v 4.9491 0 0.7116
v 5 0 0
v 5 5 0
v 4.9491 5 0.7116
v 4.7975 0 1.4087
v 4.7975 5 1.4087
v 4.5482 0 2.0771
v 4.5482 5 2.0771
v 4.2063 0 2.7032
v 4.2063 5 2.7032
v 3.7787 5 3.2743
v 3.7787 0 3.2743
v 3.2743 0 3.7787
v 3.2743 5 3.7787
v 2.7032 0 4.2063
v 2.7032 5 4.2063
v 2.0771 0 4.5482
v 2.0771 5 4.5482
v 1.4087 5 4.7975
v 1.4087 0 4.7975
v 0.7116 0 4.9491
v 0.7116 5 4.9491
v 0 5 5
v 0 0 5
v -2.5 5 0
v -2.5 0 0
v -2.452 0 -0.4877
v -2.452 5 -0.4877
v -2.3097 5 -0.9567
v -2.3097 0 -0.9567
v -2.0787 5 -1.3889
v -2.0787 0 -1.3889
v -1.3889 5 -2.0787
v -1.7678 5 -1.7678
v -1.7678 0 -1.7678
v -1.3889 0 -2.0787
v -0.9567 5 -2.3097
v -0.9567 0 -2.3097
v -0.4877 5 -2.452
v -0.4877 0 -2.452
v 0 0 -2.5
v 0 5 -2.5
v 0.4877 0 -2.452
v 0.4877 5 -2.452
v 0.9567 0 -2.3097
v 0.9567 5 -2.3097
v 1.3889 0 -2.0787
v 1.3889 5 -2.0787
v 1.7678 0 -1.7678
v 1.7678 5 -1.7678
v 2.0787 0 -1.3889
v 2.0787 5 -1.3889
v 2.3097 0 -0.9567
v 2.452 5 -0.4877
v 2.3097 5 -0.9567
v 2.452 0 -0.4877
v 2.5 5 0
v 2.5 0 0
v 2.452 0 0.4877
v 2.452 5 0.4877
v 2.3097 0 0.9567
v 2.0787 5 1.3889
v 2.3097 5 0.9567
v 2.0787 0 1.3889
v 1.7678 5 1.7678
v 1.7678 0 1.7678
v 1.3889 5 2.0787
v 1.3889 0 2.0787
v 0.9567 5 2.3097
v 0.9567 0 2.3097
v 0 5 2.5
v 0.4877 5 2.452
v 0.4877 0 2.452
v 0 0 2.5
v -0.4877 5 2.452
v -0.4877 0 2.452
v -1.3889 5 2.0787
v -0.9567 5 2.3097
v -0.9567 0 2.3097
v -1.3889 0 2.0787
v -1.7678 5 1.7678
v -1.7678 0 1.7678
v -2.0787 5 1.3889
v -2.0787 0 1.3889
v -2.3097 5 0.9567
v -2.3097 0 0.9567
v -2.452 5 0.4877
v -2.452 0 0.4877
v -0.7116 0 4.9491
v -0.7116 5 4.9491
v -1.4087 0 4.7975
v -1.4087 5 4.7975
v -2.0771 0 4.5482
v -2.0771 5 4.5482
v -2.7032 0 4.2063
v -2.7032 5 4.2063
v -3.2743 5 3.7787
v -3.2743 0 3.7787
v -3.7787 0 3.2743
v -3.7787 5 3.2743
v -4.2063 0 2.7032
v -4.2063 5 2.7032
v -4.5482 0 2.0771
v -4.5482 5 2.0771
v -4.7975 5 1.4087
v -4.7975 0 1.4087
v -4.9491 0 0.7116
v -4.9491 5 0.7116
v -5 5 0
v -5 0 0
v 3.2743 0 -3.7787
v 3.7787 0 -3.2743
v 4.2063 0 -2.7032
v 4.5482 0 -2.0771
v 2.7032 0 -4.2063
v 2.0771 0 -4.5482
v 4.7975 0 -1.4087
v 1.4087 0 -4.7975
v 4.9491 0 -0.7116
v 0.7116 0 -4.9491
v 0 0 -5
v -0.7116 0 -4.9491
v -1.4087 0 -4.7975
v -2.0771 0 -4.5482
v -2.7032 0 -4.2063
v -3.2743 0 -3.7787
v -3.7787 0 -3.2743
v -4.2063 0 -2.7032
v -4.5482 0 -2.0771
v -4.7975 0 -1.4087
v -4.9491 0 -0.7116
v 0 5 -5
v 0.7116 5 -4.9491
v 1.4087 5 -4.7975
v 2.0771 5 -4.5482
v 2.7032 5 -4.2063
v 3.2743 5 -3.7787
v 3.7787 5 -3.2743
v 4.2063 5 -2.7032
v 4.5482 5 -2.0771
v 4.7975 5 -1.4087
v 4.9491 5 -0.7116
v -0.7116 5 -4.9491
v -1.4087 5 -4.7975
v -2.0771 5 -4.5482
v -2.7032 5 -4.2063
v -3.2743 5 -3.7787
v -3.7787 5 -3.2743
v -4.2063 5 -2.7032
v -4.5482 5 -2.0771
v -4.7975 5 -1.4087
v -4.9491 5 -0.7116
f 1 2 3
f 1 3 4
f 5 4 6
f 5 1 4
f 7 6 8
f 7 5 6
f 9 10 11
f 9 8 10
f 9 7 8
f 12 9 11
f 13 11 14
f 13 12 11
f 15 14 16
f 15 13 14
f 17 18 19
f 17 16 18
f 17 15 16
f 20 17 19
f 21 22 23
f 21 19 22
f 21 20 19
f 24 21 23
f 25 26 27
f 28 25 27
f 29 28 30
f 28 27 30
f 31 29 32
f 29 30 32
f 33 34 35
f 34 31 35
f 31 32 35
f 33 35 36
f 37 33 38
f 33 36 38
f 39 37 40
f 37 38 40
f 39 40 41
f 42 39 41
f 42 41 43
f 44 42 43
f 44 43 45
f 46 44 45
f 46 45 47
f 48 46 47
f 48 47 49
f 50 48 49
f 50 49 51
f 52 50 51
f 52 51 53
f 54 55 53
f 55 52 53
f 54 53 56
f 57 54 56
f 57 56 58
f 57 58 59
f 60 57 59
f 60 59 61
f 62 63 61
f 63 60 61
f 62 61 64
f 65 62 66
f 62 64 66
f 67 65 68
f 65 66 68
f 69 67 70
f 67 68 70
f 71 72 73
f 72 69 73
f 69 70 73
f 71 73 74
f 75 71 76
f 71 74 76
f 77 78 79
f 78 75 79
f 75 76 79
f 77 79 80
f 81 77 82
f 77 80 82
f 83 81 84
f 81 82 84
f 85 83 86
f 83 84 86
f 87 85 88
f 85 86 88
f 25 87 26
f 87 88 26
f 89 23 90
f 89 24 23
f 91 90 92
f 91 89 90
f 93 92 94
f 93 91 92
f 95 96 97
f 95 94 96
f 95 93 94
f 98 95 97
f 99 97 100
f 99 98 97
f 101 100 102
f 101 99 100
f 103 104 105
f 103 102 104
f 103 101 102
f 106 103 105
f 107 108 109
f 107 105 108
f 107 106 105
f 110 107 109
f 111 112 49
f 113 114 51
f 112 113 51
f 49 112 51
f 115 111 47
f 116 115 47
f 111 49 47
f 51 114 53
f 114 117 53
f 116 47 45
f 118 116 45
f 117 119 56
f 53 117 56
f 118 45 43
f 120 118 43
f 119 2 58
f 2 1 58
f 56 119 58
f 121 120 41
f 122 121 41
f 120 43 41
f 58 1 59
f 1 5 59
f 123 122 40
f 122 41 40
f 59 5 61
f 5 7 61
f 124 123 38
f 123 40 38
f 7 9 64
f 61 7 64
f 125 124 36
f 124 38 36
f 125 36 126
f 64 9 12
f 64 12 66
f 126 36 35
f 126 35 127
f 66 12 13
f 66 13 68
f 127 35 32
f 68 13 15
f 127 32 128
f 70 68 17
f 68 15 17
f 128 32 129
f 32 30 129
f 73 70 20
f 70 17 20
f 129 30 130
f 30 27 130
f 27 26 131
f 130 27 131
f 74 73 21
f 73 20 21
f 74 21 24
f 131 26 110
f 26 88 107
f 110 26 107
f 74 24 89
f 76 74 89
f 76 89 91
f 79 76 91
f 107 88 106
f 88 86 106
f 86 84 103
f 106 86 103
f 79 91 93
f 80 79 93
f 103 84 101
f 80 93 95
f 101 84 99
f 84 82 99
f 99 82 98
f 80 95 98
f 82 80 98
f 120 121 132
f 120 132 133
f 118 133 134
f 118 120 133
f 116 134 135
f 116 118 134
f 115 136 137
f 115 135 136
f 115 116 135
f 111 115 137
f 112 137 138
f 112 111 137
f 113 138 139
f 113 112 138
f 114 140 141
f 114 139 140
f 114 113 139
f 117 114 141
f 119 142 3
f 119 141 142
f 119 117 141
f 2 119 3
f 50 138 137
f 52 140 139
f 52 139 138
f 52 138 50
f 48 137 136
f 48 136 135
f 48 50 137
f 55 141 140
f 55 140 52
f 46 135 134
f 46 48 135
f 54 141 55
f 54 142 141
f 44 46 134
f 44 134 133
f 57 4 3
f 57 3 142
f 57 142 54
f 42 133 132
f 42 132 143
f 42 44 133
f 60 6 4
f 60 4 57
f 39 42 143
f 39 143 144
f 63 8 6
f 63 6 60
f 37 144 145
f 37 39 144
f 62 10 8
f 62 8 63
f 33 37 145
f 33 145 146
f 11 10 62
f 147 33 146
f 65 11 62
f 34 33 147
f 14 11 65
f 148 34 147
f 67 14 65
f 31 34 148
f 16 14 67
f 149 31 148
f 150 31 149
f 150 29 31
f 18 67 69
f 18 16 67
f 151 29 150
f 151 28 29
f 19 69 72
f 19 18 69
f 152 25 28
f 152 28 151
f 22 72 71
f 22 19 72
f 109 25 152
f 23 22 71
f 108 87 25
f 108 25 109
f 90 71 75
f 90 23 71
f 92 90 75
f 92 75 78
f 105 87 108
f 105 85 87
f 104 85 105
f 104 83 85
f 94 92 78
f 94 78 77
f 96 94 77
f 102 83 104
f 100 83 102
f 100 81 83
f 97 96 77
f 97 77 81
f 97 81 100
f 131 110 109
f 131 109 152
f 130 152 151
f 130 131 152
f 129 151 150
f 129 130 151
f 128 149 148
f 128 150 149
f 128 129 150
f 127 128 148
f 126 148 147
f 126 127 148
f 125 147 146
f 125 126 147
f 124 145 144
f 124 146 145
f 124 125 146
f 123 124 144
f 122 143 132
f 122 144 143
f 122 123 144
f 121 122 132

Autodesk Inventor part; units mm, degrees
ref_plane "YZ Plane" through (0, 0, 0) normal (1, 0, 0) x (0, 1, 0)
ref_plane "XZ Plane" through (0, 0, 0) normal (0, 1, 0) x (-1, 0, 0)
ref_plane "XY Plane" through (0, 0, 0) normal (0, 0, 1) x (1, 0, 0)
sketch "Sketch1" plane through (0, 0, 0) normal (0, 1, 0) x (-1, 0, 0)
  line L0 (0, -5) -> (0, -5)
  line L1 (5, 0) -> (5, 0)
  line L2 (0, 5) -> (0, 5)
  line L3 (-5, 0) -> (-5, 0)
  line L4 (-5, -5) -> (5, 5) construction
  line L5 (5, -5) -> (-5, 5) construction
  circle A0 centre (0, 0) radius 2.5
  arc A1 (0, 5) -> (-5, 0) centre (0, 0) ccw
  arc A2 (5, 0) -> (0, 5) centre (0, 0) ccw
  arc A3 (0, -5) -> (5, 0) centre (0, 0) ccw
  arc A4 (-5, 0) -> (0, -5) centre (0, 0) ccw
  point P0 (0, 5)
  point P1 (-5, 0)
  dimension "d0" = 10
  dimension "d1" = 10
  dimension "d46" = 5
  dimension "d47" = 5
extrude "Extrusion1" add sketch "Sketch1" along normal blind 5
equation "\"BendRadius\" = Thickness"
equation "\"BendReliefWidth\" = Thickness"
equation "\"BendReliefDepth\" = 0.5 * Thickness"
equation "\"CornerReliefSize\" = 4 * Thickness"
equation "\"MinimumRemnant\" = 2 * Thickness"
equation "\"TransitionRadius\" = BendRadius"
equation "\"JacobiRadiusSize\" = BendRadius"
equation "\"GapSize\" = Thickness"
equation "\"Thickness\" = 3.048"
properties part number "base"
